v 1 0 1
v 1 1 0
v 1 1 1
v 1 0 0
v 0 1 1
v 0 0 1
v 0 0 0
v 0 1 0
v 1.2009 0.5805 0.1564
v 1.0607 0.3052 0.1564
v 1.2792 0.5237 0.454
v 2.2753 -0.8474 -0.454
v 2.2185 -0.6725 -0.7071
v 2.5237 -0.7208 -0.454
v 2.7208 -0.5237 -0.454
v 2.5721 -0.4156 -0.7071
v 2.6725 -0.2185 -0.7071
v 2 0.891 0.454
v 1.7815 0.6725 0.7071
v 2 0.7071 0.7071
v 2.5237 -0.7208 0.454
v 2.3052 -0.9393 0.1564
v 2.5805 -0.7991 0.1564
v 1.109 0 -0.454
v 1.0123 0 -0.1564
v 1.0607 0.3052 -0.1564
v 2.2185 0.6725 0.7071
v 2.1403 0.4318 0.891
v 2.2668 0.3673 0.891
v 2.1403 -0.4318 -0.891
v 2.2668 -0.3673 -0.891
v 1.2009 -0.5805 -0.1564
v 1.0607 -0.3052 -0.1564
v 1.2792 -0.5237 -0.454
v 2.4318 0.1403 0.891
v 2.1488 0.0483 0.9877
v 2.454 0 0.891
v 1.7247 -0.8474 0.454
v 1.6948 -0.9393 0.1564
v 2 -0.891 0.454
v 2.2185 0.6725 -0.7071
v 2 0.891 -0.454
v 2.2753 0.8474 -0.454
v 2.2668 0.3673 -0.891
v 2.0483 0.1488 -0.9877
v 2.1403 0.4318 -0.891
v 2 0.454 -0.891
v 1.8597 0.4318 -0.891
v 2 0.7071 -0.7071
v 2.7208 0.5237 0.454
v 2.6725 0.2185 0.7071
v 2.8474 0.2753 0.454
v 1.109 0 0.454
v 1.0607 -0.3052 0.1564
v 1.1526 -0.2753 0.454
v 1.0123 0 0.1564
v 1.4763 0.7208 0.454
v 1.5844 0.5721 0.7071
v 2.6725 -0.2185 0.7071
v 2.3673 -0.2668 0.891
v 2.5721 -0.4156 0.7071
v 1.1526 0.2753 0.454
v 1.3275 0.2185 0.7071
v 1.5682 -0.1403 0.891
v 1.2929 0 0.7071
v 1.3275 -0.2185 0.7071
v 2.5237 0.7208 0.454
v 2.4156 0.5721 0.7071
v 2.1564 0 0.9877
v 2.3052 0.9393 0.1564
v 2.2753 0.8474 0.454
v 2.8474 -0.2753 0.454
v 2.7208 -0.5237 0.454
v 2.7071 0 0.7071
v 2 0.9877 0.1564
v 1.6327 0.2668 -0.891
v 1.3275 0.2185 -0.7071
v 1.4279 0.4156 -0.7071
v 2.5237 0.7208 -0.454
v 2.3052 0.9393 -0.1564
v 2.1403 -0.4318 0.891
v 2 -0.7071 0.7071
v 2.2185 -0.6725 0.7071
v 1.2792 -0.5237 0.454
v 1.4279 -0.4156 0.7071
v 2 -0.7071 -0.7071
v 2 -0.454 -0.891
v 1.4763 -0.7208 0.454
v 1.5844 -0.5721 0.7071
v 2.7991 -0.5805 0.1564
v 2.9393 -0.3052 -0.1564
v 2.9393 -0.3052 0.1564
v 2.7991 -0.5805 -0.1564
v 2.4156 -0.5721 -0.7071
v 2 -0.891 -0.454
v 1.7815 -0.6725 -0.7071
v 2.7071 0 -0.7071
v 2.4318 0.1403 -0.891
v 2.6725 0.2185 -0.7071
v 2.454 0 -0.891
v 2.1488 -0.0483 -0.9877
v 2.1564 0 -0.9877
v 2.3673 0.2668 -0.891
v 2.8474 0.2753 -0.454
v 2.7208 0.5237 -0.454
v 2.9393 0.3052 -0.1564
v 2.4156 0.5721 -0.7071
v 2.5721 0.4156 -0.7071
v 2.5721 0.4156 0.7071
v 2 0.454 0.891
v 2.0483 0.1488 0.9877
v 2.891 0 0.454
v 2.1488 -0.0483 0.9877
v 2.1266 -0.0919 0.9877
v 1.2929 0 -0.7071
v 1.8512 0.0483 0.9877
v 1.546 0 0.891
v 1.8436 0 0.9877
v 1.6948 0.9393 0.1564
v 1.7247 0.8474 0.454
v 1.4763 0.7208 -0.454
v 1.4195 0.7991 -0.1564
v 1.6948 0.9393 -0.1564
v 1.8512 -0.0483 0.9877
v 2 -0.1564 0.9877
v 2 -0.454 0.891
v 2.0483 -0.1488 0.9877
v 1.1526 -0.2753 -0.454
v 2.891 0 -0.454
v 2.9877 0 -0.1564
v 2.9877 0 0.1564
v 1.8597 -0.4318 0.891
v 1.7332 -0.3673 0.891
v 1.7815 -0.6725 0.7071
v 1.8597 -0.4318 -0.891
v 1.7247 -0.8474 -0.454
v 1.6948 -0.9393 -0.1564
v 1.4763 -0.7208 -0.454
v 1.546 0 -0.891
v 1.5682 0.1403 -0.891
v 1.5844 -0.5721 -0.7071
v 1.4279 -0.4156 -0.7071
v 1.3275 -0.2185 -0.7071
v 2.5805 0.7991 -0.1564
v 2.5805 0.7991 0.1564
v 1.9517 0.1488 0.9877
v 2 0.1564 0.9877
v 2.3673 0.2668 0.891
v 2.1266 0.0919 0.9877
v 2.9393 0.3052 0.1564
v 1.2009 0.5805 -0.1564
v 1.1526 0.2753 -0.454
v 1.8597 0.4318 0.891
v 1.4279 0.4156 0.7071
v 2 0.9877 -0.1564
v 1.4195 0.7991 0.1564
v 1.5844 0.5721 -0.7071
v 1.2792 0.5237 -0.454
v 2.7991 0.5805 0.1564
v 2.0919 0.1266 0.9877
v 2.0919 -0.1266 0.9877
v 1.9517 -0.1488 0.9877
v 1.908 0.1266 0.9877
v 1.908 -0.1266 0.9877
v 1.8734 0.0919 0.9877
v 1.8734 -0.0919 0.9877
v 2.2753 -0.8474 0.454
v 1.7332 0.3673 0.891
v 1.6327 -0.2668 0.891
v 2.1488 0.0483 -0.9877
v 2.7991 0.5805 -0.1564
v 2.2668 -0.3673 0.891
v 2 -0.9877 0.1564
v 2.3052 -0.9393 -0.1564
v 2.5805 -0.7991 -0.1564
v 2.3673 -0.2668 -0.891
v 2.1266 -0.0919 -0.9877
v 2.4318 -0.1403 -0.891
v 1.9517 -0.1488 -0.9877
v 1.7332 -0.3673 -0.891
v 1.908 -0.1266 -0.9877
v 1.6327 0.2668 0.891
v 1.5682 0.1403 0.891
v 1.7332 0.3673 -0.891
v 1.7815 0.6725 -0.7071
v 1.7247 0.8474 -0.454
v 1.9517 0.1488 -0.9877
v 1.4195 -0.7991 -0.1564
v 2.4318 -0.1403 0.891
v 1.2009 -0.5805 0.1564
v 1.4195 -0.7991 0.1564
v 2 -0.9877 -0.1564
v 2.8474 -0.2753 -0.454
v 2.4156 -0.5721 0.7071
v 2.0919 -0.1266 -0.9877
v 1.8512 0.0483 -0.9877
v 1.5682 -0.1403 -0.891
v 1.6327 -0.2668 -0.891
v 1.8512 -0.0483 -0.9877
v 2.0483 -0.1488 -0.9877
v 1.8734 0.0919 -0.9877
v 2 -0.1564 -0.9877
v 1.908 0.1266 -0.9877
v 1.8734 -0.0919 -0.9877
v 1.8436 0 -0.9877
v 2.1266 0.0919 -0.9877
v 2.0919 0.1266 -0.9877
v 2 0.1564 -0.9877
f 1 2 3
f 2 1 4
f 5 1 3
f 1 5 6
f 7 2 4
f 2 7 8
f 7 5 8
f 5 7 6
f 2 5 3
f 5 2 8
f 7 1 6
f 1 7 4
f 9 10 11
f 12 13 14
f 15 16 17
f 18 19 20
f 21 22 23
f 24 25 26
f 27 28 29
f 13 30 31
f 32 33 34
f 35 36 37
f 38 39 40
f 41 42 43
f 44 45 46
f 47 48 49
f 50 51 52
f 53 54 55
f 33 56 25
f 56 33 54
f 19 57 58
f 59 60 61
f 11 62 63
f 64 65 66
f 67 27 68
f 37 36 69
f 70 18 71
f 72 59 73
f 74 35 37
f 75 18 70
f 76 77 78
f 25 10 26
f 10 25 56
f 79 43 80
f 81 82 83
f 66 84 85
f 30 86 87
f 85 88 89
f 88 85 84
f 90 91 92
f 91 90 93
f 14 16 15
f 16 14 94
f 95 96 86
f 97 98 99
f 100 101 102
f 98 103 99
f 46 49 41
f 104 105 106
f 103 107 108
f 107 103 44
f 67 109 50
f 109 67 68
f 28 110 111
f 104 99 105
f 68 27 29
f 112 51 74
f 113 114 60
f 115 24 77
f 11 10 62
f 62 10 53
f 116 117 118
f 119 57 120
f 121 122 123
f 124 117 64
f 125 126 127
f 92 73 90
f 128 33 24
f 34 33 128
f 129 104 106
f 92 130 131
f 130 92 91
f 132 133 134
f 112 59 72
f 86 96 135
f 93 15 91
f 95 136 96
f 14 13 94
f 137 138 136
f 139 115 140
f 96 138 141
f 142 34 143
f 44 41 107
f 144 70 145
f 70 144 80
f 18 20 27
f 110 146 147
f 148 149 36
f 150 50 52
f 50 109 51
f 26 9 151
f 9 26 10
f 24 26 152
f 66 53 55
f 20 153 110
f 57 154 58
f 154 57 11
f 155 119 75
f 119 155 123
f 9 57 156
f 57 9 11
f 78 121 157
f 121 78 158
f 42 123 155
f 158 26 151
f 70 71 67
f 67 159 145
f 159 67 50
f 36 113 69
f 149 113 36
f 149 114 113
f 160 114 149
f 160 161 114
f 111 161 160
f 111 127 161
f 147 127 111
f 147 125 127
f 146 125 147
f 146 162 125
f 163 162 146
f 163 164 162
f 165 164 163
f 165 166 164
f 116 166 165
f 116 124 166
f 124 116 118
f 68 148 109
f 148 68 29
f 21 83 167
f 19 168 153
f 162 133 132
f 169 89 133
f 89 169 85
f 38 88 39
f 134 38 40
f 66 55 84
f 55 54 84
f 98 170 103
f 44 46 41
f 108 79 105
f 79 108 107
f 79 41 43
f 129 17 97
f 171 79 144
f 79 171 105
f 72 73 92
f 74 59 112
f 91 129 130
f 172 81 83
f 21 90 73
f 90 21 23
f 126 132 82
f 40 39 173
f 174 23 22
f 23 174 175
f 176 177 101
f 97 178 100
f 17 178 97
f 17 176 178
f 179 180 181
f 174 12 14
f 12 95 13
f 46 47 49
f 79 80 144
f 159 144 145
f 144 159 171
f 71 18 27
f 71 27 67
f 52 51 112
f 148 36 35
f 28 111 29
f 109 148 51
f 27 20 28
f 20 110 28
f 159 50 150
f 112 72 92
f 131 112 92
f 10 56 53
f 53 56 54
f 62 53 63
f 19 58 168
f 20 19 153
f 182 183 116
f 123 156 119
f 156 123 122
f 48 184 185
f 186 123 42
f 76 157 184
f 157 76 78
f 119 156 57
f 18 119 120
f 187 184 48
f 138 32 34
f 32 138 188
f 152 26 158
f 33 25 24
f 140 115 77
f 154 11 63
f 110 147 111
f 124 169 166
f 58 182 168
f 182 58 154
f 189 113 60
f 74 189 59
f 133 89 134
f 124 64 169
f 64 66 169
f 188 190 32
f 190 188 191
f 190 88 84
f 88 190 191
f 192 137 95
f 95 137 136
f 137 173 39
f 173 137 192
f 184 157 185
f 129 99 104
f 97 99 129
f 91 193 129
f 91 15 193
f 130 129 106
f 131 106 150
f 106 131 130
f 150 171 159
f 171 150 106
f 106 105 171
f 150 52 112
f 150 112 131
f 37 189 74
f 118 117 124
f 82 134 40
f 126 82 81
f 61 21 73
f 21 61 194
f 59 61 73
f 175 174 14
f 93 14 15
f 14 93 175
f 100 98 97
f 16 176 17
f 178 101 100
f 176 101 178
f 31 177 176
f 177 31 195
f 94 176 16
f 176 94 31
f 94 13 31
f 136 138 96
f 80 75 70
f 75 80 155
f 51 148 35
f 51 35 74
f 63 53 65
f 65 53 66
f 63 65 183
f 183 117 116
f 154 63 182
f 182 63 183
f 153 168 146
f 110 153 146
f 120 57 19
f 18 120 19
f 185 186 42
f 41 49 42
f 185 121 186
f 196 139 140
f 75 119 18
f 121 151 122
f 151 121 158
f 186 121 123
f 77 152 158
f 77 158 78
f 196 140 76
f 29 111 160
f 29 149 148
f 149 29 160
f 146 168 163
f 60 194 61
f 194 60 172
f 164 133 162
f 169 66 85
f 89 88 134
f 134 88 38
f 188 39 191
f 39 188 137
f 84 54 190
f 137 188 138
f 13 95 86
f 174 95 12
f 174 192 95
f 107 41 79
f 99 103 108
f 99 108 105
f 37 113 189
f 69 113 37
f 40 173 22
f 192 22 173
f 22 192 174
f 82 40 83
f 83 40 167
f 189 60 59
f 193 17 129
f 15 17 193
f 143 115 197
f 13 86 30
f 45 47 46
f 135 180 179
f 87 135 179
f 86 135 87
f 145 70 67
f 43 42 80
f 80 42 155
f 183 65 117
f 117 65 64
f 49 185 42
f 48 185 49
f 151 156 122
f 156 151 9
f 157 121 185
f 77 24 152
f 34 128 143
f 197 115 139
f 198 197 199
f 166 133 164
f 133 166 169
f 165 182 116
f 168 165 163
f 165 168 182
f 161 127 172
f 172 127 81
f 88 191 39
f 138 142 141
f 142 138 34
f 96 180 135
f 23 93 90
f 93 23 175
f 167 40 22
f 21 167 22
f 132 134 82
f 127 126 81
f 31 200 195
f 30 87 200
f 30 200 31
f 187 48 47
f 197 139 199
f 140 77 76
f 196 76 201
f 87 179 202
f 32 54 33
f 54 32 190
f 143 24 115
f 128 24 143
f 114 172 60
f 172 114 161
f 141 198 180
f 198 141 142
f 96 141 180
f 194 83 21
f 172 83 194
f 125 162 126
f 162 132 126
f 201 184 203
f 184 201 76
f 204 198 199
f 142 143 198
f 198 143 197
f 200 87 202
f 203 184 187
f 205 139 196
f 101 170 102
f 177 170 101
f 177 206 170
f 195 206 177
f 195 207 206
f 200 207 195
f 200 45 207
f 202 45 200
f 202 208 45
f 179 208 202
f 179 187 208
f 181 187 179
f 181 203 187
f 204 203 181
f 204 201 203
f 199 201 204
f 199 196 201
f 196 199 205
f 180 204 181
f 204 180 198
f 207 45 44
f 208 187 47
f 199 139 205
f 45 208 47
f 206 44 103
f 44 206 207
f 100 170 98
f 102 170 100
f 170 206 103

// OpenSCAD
// source: https://erik.nygren.org/2018-3dprint-multicolor-openscad.html

/* Pick a color below for STL export, or "ALL" to show all colors. */
current_color = "ALL";
//current_color = "White";
//current_color = "Cyan";
//current_color = "DarkOrange";
//current_color = "Black";

transparent_aquamarine()
    cube([1, 1, 1]);

orange()
    translate([2, 0, 0])
        sphere(r = 1, $fn=20);

/* Similar to the color function, but can be used for generating multi-color models for printing.
 * The global current_color variable indicates the color to print.
 */
module multicolor(color) {
    if (current_color != "ALL" && current_color != color) { 
        // ignore our children.
    } else {
        color(color)
            children();
    }        
}


module transparent_aquamarine() {
    multicolor("Aquamarine") children();
}

module transparent_light_cyan() {
    multicolor("LightCyan") children();
}

module cyan() {
    multicolor("Cyan") children();
}

module orange() {
    multicolor("DarkOrange") children();
}

module white() {
    multicolor("White") children();
}

module black() {
    multicolor("Black") children();
}
